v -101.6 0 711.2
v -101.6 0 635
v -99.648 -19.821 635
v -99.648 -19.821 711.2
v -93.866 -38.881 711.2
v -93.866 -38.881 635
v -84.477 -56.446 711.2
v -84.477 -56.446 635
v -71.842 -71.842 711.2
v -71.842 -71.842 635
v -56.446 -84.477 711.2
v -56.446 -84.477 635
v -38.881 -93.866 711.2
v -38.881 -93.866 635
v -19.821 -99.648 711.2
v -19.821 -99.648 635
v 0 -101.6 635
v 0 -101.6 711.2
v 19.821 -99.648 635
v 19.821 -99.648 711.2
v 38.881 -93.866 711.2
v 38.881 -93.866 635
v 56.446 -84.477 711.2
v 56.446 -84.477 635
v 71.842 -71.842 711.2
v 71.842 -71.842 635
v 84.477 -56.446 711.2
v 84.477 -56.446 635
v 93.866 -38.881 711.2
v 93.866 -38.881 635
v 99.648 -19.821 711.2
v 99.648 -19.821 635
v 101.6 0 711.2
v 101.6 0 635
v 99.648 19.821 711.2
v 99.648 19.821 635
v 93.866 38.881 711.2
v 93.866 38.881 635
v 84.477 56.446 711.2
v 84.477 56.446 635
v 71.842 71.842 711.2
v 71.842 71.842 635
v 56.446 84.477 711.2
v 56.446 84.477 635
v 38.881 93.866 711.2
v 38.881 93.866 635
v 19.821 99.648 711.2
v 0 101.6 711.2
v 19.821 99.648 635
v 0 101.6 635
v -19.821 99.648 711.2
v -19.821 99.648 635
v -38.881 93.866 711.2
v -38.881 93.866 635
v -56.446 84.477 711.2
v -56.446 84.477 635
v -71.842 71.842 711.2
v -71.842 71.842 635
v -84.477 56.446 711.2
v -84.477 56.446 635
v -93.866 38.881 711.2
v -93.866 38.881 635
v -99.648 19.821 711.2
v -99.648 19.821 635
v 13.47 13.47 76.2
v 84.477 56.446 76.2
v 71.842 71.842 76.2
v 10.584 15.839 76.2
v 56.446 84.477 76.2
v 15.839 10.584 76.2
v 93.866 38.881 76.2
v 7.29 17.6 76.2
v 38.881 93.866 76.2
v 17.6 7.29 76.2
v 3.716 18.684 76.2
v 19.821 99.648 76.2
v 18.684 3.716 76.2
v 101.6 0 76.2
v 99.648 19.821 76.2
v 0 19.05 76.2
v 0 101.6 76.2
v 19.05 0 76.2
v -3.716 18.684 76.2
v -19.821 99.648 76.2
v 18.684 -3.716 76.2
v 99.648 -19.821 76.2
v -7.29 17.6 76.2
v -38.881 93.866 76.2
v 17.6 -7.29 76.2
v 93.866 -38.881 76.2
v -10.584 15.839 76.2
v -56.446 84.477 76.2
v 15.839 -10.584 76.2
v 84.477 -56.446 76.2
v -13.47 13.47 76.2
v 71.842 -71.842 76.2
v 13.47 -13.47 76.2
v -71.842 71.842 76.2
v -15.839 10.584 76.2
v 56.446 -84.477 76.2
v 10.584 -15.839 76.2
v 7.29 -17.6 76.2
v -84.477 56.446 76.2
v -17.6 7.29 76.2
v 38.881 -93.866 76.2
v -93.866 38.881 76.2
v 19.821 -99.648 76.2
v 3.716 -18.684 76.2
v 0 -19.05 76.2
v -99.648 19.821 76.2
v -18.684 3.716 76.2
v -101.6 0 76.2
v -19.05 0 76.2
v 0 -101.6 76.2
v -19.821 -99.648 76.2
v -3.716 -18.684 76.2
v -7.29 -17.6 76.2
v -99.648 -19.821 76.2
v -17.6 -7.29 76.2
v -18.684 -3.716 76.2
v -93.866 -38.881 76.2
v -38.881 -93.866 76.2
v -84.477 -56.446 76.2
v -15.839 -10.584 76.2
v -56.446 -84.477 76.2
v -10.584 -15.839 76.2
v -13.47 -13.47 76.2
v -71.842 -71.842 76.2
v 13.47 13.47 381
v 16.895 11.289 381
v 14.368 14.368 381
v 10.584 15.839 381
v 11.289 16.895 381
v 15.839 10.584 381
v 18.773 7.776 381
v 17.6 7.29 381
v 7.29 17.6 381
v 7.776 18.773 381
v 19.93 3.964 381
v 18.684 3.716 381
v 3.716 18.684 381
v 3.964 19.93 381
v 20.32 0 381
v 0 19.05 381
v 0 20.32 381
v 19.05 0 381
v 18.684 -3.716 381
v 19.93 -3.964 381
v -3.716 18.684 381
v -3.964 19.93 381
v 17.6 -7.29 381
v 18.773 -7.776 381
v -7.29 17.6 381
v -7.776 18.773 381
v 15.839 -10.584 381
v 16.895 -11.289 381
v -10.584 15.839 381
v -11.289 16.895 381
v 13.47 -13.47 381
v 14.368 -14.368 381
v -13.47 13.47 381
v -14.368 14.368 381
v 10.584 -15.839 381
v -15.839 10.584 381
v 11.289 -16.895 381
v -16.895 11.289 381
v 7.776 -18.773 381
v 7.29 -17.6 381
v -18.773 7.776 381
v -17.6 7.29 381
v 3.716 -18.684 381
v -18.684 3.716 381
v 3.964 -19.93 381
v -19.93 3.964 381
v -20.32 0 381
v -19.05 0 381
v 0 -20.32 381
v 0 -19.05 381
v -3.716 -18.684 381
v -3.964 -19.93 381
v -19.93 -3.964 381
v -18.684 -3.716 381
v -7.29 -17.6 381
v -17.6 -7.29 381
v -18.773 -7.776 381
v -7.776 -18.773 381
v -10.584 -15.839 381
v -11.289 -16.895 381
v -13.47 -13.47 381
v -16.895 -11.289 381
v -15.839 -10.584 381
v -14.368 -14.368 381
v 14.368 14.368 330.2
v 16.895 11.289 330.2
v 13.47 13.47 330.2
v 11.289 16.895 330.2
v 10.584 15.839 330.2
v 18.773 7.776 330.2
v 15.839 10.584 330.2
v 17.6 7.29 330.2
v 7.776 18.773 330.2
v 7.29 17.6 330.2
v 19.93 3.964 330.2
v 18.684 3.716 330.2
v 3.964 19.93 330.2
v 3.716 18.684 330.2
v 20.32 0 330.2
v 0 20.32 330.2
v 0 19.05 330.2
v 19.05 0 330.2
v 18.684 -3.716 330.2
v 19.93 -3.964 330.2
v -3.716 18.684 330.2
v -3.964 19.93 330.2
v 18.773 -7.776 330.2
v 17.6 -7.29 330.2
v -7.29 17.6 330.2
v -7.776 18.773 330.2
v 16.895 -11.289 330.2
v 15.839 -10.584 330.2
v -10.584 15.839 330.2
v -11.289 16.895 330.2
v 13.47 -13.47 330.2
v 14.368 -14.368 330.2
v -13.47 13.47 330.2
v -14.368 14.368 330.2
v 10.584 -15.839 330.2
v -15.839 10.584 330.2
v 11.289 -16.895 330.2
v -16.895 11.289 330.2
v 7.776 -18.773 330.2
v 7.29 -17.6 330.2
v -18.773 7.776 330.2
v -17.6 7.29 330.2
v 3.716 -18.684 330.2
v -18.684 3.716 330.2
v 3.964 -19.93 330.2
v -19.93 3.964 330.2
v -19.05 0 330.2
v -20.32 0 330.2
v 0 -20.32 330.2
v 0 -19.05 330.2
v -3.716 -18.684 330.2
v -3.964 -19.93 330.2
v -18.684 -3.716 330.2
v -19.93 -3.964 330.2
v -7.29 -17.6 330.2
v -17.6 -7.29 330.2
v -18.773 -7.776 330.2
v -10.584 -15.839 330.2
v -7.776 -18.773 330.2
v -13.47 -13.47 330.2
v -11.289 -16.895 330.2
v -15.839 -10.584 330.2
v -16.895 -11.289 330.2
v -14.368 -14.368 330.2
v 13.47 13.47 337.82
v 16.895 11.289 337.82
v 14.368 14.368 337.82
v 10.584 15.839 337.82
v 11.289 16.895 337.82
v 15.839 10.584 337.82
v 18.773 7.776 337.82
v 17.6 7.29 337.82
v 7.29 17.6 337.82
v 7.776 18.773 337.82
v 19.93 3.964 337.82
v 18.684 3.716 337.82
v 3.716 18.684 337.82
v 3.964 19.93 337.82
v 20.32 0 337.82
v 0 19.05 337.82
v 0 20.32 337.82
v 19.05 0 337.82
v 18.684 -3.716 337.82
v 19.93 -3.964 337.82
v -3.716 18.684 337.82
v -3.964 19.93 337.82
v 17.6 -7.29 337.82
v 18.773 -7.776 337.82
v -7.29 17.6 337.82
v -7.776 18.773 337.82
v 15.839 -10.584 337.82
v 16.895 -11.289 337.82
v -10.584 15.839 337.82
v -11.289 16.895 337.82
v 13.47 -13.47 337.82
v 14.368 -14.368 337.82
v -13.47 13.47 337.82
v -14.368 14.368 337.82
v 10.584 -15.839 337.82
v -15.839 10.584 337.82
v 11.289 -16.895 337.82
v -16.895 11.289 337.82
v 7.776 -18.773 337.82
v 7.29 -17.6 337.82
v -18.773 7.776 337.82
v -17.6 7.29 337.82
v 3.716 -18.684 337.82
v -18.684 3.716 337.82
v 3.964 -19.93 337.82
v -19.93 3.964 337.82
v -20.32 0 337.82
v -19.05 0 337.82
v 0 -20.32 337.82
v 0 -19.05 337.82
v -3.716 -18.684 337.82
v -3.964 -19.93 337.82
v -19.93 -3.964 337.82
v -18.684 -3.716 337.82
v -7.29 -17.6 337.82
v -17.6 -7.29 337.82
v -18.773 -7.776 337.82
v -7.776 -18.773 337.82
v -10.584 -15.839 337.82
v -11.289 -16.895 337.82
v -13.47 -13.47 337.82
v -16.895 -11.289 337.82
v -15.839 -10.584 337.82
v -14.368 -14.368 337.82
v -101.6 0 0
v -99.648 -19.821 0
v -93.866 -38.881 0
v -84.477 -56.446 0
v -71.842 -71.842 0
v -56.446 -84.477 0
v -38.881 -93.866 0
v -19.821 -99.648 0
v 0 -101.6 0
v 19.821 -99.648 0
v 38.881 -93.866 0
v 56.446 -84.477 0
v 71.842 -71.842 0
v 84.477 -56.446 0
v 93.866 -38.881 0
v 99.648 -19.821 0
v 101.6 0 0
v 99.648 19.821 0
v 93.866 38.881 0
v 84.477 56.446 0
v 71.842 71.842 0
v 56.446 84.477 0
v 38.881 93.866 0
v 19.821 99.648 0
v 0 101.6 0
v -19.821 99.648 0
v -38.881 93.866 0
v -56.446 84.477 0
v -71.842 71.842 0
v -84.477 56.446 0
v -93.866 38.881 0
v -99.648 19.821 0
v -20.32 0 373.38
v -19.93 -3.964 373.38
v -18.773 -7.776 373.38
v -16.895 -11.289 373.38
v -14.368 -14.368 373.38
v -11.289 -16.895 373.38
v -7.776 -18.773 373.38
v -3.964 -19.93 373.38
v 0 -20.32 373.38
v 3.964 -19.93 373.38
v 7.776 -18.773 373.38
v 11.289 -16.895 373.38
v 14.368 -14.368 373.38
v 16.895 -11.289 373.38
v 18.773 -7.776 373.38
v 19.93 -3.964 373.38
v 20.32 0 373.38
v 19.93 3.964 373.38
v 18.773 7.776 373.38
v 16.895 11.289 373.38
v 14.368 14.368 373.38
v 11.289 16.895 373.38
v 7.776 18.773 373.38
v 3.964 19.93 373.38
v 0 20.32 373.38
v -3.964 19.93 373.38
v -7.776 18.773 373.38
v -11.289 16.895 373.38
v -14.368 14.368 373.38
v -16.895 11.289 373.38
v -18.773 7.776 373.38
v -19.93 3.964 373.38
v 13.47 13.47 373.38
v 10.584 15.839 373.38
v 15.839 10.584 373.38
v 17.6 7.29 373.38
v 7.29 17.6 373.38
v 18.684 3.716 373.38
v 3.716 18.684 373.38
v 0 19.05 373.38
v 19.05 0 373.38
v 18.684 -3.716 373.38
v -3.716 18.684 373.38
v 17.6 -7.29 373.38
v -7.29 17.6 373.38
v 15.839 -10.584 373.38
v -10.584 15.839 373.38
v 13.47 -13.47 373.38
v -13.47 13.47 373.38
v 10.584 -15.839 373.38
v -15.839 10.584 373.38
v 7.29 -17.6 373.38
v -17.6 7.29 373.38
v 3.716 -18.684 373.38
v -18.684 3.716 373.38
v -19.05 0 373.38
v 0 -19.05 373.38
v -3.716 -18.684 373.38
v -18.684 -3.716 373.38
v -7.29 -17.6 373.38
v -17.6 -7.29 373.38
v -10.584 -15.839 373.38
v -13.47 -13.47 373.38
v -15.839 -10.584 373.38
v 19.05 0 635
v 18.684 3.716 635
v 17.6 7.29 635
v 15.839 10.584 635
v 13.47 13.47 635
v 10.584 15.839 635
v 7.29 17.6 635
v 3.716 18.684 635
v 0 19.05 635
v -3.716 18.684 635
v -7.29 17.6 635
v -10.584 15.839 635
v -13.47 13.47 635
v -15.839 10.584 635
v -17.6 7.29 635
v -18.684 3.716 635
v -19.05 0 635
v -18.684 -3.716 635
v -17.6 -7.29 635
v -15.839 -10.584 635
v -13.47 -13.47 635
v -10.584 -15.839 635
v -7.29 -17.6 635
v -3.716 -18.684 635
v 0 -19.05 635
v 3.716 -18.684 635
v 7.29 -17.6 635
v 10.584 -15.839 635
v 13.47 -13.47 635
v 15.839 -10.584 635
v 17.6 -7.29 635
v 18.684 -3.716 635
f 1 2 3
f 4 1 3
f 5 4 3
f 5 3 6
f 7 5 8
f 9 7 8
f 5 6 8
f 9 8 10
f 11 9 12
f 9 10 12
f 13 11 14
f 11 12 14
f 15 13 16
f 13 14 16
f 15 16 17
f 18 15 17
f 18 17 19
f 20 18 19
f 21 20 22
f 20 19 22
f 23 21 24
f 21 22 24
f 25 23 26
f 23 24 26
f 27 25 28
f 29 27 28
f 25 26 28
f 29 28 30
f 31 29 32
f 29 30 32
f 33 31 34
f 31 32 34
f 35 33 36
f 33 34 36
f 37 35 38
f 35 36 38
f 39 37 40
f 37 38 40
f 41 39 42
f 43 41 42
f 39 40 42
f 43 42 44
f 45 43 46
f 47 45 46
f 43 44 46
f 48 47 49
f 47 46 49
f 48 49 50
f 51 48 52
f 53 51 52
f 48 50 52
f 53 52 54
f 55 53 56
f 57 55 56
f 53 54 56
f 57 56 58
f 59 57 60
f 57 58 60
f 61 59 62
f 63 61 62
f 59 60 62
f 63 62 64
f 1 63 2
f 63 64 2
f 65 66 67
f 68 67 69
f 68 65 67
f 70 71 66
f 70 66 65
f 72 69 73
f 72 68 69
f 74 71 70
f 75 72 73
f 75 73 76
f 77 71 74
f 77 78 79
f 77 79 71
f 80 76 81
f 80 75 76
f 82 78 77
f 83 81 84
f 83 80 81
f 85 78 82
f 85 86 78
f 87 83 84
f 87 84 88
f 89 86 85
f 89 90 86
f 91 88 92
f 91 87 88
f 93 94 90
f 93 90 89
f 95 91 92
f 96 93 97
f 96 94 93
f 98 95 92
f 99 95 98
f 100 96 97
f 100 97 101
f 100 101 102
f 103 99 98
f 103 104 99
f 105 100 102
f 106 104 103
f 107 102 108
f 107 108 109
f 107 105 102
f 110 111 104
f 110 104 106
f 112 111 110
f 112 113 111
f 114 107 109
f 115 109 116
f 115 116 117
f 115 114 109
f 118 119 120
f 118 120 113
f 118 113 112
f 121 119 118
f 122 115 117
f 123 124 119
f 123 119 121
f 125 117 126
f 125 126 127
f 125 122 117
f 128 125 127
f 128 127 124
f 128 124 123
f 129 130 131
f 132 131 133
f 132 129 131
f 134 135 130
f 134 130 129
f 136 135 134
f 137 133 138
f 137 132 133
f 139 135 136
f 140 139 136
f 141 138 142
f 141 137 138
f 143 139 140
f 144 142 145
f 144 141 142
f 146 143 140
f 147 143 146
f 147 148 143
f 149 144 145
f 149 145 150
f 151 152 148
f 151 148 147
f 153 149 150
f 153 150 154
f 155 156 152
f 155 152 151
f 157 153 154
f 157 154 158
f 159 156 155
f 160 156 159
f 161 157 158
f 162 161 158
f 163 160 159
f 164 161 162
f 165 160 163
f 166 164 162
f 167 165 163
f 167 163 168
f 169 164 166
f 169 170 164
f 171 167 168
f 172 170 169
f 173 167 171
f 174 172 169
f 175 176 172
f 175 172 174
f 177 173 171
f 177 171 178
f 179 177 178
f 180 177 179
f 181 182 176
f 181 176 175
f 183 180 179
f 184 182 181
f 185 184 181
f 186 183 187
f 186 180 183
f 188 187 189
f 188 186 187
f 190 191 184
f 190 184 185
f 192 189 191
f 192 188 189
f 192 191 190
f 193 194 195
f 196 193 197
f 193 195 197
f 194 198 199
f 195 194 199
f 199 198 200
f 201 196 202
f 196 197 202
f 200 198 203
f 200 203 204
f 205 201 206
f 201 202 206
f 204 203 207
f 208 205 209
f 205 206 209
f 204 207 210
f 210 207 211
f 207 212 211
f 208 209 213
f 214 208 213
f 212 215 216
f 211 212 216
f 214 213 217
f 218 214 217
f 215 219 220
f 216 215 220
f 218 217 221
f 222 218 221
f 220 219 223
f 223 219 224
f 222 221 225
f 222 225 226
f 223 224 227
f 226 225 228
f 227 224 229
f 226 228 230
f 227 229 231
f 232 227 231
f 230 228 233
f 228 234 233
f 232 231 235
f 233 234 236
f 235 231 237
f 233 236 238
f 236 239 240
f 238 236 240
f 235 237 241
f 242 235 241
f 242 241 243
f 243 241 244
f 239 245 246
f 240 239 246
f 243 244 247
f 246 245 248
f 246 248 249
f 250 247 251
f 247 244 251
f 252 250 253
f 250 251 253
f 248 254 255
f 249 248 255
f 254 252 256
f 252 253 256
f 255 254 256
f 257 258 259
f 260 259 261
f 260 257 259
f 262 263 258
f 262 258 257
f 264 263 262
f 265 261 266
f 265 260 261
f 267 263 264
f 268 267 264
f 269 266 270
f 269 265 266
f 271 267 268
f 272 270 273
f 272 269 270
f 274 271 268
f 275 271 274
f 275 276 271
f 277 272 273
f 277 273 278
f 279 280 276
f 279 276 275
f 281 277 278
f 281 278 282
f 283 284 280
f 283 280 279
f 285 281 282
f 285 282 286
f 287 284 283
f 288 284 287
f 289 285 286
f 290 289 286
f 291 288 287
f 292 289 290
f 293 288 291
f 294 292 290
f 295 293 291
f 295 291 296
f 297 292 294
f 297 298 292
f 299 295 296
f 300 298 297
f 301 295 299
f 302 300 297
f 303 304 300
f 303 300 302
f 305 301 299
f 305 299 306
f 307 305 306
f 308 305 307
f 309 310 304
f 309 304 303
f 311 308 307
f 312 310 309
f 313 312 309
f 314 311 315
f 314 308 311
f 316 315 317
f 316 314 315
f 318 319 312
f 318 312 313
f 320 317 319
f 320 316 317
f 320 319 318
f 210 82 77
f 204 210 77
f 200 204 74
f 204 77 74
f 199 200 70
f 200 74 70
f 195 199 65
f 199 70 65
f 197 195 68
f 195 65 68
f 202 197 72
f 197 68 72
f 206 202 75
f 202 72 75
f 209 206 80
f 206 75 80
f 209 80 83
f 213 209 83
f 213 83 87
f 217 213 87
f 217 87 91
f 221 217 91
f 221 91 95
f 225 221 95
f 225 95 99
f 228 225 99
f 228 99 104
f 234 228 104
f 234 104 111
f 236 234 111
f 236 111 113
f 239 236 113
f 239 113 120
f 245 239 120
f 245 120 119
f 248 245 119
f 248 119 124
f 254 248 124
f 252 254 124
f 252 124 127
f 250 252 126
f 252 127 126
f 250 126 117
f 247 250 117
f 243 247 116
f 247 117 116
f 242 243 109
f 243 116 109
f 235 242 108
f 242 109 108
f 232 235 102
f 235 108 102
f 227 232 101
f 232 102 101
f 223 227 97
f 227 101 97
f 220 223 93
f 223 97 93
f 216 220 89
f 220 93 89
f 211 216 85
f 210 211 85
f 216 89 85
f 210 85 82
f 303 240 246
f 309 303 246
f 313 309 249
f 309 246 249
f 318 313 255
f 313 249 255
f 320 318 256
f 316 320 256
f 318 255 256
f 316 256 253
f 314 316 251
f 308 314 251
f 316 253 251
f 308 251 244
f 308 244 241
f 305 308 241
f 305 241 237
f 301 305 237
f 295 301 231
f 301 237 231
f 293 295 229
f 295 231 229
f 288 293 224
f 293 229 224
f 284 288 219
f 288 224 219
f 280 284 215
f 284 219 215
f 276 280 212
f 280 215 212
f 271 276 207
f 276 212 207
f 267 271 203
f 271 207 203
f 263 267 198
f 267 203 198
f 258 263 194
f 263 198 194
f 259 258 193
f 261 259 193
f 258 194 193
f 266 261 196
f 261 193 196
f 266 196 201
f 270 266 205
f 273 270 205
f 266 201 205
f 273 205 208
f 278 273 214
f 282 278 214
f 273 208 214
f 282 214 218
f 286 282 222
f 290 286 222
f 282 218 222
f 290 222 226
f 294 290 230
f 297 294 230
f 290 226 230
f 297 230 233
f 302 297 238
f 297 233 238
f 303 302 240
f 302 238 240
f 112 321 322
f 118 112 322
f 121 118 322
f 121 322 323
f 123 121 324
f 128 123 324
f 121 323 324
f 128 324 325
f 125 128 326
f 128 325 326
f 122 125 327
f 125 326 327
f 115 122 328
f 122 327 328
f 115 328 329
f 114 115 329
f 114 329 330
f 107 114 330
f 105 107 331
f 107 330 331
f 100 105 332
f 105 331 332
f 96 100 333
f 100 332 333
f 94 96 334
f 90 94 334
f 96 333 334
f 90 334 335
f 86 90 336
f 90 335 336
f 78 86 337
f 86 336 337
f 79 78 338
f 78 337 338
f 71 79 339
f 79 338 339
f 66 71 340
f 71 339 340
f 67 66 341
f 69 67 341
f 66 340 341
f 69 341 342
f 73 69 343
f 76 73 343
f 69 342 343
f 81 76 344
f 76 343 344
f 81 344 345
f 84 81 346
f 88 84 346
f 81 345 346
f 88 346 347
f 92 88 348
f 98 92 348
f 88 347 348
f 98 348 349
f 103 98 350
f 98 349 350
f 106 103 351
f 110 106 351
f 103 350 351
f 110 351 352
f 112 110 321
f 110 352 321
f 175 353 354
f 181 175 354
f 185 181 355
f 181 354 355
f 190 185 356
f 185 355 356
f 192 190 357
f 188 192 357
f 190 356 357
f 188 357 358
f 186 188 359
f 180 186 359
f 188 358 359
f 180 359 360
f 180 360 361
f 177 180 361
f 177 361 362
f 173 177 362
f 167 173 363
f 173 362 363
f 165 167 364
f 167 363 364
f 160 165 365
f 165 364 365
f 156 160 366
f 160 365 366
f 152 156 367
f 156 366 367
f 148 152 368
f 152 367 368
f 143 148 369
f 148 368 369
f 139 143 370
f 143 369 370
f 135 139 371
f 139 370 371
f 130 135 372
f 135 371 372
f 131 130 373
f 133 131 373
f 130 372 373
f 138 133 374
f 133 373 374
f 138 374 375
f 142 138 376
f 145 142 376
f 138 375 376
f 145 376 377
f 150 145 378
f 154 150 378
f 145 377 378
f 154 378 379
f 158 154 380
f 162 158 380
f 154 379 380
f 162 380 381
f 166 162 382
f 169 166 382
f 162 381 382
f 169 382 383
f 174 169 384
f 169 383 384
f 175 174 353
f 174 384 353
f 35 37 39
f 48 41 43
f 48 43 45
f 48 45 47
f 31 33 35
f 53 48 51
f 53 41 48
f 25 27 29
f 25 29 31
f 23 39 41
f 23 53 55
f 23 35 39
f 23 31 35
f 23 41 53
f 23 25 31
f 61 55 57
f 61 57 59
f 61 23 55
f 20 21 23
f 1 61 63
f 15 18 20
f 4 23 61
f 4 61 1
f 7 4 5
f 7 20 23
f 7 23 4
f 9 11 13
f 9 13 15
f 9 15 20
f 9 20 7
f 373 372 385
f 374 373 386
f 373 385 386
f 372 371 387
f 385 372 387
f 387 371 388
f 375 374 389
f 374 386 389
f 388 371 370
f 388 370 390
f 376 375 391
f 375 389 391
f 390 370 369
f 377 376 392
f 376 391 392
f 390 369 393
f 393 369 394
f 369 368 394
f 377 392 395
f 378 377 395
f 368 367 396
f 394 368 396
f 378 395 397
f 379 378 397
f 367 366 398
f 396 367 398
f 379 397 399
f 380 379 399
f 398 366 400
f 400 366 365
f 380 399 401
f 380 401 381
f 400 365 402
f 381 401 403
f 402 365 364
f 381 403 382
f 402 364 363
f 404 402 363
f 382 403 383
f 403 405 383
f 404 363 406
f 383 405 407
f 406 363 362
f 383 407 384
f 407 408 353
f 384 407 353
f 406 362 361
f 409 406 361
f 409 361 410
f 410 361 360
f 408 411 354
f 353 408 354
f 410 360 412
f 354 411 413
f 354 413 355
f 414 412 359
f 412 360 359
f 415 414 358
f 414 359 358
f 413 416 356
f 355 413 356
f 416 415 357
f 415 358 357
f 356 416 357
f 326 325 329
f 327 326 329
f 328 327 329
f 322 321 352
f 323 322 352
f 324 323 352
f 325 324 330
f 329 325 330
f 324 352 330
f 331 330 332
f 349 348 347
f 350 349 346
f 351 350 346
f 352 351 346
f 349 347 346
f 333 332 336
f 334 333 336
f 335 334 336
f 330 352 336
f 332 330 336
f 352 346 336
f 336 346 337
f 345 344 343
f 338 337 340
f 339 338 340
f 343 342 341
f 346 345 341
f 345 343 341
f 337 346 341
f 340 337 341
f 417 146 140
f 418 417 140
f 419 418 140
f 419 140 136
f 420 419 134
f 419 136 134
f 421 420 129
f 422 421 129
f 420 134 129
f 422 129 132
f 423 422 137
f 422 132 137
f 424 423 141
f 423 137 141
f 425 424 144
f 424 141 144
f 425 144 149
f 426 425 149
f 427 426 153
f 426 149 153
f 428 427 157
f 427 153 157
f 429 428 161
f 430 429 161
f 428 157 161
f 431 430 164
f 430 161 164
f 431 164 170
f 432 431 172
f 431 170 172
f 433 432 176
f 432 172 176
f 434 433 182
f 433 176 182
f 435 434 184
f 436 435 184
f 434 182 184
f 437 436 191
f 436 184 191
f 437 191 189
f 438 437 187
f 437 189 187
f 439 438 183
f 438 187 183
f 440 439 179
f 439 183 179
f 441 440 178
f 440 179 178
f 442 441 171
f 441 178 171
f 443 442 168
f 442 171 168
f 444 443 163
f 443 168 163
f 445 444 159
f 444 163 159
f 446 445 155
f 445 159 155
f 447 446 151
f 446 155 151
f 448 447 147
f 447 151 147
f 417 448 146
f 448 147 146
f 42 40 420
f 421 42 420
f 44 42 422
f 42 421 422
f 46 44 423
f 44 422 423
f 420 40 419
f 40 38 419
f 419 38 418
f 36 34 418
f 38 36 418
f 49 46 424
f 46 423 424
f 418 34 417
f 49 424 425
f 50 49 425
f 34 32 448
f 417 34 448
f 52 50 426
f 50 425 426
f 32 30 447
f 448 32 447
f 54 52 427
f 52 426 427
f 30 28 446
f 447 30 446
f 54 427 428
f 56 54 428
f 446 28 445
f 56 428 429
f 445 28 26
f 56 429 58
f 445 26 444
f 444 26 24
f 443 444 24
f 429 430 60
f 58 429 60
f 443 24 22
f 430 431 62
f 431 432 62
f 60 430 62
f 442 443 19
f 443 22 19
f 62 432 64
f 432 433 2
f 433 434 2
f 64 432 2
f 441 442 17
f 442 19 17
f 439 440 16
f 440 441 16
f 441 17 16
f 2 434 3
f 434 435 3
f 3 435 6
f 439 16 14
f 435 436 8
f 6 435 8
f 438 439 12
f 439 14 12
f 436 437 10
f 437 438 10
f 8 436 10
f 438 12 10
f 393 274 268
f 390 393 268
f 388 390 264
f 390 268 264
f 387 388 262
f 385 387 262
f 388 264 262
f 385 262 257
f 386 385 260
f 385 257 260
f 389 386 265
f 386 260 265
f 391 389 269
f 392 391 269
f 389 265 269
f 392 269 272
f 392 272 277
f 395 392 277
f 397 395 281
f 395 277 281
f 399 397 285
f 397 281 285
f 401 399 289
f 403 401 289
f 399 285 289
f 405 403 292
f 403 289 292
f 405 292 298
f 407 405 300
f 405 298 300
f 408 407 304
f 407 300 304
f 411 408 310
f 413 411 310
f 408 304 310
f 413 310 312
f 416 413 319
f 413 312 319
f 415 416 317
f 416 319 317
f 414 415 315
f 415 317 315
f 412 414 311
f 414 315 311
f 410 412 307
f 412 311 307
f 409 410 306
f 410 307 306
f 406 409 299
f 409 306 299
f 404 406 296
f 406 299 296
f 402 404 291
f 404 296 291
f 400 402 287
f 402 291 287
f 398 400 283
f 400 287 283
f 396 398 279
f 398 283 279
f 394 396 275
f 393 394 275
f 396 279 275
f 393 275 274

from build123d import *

# Parameters (mm, degrees)
SKETCH2_R               = 101.6
BOSS_EXTRUDE1_DEPTH     = 76.2
SKETCH3_R               = 19.05
BOSS_EXTRUDE2_DEPTH     = 330.2
SKETCH12_R              = 20.32
BOSS_EXTRUDE5_DEPTH     = 7.62
BOSS_EXTRUDE6_OUTLINE_R = 19.05
BOSS_EXTRUDE6_DEPTH     = 35.56
SKETCH14_R              = 20.32
BOSS_EXTRUDE7_DEPTH     = 7.62
BOSS_EXTRUDE8_OUTLINE_R = 19.05
BOSS_EXTRUDE8_DEPTH     = 254
SKETCH16_R              = 101.6
BOSS_EXTRUDE9_DEPTH     = 76.2


# Read off the part's stored shape, not the designer's step: Boss-Extrude6, Boss-Extrude8
with BuildPart() as part:
    # Sketch2 → Boss-Extrude1 (new body)
    with BuildSketch(Plane.XY):
        with Locations(Location((0, 0, 0), (0, 0, 180))):
            Circle(SKETCH2_R)
    extrude(amount=BOSS_EXTRUDE1_DEPTH)

    # Sketch3 → Boss-Extrude2 (add)
    with BuildSketch(Plane.XY):
        Circle(SKETCH3_R)
    extrude(amount=BOSS_EXTRUDE2_DEPTH)

    # Sketch12 → Boss-Extrude5 (add)
    with BuildSketch(Plane.XY.offset(330.2)):
        with Locations(Location((0, 0, 0), (0, 0, 180))):
            Circle(SKETCH12_R)
    extrude(amount=BOSS_EXTRUDE5_DEPTH)

    # Boss-Extrude6 outline → Boss-Extrude6 (add)
    with BuildSketch(Plane.XY.offset(337.82)):
        Circle(BOSS_EXTRUDE6_OUTLINE_R)
    extrude(amount=BOSS_EXTRUDE6_DEPTH)

    # Sketch14 → Boss-Extrude7 (add)
    with BuildSketch(Plane.XY.offset(373.38)):
        with Locations(Location((0, 0, 0), (0, 0, 180))):
            Circle(SKETCH14_R)
    extrude(amount=BOSS_EXTRUDE7_DEPTH)

    # Boss-Extrude8 outline → Boss-Extrude8 (add)
    with BuildSketch(Plane.XY.offset(381)):
        Circle(BOSS_EXTRUDE8_OUTLINE_R)
    extrude(amount=BOSS_EXTRUDE8_DEPTH)

    # Sketch16 → Boss-Extrude9 (add)
    with BuildSketch(Plane.XY.offset(635)):
        with Locations(Location((0, 0, 0), (0, 0, 180))):
            Circle(SKETCH16_R)
    extrude(amount=BOSS_EXTRUDE9_DEPTH)


solid = part.part
